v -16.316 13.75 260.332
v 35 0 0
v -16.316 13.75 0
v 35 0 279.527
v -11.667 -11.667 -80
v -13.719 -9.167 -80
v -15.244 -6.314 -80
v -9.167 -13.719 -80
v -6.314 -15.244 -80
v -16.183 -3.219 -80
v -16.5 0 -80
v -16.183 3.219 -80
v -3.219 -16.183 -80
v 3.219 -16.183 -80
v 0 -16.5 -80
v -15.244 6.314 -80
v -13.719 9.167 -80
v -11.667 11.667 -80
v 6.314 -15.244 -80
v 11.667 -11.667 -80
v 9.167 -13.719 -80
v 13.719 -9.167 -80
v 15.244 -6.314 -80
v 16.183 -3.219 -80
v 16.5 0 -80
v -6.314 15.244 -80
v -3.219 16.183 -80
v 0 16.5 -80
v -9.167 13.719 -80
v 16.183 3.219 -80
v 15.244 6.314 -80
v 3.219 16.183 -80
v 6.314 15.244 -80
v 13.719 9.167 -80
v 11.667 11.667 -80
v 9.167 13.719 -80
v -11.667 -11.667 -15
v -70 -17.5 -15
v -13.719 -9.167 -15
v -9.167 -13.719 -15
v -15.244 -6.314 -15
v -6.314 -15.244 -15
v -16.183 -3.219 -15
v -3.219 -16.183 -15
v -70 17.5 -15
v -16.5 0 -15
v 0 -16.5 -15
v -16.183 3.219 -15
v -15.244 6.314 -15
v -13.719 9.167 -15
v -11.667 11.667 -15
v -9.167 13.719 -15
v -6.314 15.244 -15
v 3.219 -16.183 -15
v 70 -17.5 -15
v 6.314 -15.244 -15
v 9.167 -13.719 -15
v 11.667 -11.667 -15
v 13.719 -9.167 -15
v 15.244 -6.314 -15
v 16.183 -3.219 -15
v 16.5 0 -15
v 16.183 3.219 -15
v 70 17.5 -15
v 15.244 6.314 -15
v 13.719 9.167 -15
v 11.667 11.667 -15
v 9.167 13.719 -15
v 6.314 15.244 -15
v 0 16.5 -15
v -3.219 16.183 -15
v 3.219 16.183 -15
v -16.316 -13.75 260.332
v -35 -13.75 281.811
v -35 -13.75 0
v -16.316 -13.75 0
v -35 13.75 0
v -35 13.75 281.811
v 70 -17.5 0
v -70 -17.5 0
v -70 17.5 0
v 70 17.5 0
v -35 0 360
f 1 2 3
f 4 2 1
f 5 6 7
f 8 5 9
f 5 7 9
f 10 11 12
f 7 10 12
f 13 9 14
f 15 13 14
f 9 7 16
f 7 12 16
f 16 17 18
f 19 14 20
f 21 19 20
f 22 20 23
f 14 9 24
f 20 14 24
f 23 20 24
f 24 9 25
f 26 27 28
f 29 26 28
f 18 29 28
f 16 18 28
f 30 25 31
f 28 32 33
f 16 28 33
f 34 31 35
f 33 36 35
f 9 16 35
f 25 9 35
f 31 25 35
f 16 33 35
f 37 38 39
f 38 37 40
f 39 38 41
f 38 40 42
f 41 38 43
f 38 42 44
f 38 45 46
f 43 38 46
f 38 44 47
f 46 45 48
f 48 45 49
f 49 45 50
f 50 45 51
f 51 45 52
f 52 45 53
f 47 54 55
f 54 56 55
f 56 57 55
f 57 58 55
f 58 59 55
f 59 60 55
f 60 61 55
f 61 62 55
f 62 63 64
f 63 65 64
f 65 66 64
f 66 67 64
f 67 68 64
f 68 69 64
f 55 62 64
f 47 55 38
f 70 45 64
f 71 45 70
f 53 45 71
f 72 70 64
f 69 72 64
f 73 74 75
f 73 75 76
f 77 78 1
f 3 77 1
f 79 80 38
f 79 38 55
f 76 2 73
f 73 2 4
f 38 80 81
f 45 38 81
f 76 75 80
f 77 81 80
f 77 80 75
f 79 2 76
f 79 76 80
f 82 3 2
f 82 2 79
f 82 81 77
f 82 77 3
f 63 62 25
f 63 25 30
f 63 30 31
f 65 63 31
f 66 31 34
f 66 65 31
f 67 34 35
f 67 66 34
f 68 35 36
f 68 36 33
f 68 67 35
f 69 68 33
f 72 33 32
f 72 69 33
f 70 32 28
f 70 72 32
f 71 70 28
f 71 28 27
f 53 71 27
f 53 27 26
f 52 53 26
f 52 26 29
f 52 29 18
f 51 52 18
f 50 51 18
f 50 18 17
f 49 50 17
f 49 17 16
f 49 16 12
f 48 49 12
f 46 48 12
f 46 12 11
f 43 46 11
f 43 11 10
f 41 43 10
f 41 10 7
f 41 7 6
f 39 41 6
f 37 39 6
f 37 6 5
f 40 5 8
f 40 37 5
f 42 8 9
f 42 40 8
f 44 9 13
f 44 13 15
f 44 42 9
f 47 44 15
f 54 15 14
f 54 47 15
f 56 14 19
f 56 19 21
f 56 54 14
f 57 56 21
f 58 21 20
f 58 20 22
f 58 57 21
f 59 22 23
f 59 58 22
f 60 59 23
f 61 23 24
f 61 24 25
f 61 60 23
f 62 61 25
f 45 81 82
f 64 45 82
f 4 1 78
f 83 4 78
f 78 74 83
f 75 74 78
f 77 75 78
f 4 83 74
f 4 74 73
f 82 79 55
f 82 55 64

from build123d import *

# Parameters (mm, degrees)
F0_R       = 16.5
F1_DEPTH   = 80
F2_W       = 140
F2_H       = 35
F2_R       = 16.5
F3_DEPTH   = 15
F4_W       = 70
F4_H       = 27.5
F5_DEPTH   = 360
F7_DEPTH   = 50
F8_SIZE2   = 13.75
F8_SIZE    = 51.3156986041
F8_2_SIZE2 = 13.74999
F8_2_SIZE  = 51.315689


# Not quite as in the source:
# - a fillet or chamfer is up to 0.001 mm smaller than in the source, because OpenCascade refuses the exact size


with BuildPart() as f1:
    # F0 (on Top) → F1 (new body)
    with BuildSketch(Plane.XY):
        Circle(F0_R)
    extrude(amount=-F1_DEPTH)

    # F2 (on face) → F3 (join)
    with BuildSketch(Plane.XY):
        Rectangle(F2_W, F2_H)
        Circle(F2_R, mode=Mode.SUBTRACT)
    extrude(amount=-F3_DEPTH)

    # F4 (on face) → F5 (join)
    with BuildSketch(Plane.XY):
        Rectangle(F4_W, F4_H)
    extrude(amount=F5_DEPTH)

    # F6 (on face) → F7 (cut)
    with BuildSketch(Plane.XZ.offset(13.75)):
        Polygon((35, 360), (-35, 360), (35, 279.5273661613), align=None)
    extrude(amount=-F7_DEPTH, mode=Mode.SUBTRACT)

    # F8
    f8_edges = [f1.edges().sort_by_distance(p)[0] for p in [
        (35, 13.75, 139.763683),
        (0, 13.75, 319.763683),
    ]]
    f8_side = f1.faces().sort_by_distance((-1.468033, 13.75, 160.725674))[0]
    chamfer(f8_edges, length=F8_SIZE, length2=F8_SIZE2, reference=f8_side)

    # F8#2 (size 51.3156986041 and 13.75 in the source; OpenCascade refuses exactly that, so slightly less here)
    f8_2_edges = [f1.edges().sort_by_distance(p)[0] for p in [
        (35, -13.75, 139.763683),
        (0, -13.75, 319.763683),
    ]]
    f8_2_side = f1.faces().sort_by_distance((-1.468033, -13.75, 160.725674))[0]
    chamfer(f8_2_edges, length=F8_2_SIZE, length2=F8_2_SIZE2, reference=f8_2_side)


solid = f1.part
